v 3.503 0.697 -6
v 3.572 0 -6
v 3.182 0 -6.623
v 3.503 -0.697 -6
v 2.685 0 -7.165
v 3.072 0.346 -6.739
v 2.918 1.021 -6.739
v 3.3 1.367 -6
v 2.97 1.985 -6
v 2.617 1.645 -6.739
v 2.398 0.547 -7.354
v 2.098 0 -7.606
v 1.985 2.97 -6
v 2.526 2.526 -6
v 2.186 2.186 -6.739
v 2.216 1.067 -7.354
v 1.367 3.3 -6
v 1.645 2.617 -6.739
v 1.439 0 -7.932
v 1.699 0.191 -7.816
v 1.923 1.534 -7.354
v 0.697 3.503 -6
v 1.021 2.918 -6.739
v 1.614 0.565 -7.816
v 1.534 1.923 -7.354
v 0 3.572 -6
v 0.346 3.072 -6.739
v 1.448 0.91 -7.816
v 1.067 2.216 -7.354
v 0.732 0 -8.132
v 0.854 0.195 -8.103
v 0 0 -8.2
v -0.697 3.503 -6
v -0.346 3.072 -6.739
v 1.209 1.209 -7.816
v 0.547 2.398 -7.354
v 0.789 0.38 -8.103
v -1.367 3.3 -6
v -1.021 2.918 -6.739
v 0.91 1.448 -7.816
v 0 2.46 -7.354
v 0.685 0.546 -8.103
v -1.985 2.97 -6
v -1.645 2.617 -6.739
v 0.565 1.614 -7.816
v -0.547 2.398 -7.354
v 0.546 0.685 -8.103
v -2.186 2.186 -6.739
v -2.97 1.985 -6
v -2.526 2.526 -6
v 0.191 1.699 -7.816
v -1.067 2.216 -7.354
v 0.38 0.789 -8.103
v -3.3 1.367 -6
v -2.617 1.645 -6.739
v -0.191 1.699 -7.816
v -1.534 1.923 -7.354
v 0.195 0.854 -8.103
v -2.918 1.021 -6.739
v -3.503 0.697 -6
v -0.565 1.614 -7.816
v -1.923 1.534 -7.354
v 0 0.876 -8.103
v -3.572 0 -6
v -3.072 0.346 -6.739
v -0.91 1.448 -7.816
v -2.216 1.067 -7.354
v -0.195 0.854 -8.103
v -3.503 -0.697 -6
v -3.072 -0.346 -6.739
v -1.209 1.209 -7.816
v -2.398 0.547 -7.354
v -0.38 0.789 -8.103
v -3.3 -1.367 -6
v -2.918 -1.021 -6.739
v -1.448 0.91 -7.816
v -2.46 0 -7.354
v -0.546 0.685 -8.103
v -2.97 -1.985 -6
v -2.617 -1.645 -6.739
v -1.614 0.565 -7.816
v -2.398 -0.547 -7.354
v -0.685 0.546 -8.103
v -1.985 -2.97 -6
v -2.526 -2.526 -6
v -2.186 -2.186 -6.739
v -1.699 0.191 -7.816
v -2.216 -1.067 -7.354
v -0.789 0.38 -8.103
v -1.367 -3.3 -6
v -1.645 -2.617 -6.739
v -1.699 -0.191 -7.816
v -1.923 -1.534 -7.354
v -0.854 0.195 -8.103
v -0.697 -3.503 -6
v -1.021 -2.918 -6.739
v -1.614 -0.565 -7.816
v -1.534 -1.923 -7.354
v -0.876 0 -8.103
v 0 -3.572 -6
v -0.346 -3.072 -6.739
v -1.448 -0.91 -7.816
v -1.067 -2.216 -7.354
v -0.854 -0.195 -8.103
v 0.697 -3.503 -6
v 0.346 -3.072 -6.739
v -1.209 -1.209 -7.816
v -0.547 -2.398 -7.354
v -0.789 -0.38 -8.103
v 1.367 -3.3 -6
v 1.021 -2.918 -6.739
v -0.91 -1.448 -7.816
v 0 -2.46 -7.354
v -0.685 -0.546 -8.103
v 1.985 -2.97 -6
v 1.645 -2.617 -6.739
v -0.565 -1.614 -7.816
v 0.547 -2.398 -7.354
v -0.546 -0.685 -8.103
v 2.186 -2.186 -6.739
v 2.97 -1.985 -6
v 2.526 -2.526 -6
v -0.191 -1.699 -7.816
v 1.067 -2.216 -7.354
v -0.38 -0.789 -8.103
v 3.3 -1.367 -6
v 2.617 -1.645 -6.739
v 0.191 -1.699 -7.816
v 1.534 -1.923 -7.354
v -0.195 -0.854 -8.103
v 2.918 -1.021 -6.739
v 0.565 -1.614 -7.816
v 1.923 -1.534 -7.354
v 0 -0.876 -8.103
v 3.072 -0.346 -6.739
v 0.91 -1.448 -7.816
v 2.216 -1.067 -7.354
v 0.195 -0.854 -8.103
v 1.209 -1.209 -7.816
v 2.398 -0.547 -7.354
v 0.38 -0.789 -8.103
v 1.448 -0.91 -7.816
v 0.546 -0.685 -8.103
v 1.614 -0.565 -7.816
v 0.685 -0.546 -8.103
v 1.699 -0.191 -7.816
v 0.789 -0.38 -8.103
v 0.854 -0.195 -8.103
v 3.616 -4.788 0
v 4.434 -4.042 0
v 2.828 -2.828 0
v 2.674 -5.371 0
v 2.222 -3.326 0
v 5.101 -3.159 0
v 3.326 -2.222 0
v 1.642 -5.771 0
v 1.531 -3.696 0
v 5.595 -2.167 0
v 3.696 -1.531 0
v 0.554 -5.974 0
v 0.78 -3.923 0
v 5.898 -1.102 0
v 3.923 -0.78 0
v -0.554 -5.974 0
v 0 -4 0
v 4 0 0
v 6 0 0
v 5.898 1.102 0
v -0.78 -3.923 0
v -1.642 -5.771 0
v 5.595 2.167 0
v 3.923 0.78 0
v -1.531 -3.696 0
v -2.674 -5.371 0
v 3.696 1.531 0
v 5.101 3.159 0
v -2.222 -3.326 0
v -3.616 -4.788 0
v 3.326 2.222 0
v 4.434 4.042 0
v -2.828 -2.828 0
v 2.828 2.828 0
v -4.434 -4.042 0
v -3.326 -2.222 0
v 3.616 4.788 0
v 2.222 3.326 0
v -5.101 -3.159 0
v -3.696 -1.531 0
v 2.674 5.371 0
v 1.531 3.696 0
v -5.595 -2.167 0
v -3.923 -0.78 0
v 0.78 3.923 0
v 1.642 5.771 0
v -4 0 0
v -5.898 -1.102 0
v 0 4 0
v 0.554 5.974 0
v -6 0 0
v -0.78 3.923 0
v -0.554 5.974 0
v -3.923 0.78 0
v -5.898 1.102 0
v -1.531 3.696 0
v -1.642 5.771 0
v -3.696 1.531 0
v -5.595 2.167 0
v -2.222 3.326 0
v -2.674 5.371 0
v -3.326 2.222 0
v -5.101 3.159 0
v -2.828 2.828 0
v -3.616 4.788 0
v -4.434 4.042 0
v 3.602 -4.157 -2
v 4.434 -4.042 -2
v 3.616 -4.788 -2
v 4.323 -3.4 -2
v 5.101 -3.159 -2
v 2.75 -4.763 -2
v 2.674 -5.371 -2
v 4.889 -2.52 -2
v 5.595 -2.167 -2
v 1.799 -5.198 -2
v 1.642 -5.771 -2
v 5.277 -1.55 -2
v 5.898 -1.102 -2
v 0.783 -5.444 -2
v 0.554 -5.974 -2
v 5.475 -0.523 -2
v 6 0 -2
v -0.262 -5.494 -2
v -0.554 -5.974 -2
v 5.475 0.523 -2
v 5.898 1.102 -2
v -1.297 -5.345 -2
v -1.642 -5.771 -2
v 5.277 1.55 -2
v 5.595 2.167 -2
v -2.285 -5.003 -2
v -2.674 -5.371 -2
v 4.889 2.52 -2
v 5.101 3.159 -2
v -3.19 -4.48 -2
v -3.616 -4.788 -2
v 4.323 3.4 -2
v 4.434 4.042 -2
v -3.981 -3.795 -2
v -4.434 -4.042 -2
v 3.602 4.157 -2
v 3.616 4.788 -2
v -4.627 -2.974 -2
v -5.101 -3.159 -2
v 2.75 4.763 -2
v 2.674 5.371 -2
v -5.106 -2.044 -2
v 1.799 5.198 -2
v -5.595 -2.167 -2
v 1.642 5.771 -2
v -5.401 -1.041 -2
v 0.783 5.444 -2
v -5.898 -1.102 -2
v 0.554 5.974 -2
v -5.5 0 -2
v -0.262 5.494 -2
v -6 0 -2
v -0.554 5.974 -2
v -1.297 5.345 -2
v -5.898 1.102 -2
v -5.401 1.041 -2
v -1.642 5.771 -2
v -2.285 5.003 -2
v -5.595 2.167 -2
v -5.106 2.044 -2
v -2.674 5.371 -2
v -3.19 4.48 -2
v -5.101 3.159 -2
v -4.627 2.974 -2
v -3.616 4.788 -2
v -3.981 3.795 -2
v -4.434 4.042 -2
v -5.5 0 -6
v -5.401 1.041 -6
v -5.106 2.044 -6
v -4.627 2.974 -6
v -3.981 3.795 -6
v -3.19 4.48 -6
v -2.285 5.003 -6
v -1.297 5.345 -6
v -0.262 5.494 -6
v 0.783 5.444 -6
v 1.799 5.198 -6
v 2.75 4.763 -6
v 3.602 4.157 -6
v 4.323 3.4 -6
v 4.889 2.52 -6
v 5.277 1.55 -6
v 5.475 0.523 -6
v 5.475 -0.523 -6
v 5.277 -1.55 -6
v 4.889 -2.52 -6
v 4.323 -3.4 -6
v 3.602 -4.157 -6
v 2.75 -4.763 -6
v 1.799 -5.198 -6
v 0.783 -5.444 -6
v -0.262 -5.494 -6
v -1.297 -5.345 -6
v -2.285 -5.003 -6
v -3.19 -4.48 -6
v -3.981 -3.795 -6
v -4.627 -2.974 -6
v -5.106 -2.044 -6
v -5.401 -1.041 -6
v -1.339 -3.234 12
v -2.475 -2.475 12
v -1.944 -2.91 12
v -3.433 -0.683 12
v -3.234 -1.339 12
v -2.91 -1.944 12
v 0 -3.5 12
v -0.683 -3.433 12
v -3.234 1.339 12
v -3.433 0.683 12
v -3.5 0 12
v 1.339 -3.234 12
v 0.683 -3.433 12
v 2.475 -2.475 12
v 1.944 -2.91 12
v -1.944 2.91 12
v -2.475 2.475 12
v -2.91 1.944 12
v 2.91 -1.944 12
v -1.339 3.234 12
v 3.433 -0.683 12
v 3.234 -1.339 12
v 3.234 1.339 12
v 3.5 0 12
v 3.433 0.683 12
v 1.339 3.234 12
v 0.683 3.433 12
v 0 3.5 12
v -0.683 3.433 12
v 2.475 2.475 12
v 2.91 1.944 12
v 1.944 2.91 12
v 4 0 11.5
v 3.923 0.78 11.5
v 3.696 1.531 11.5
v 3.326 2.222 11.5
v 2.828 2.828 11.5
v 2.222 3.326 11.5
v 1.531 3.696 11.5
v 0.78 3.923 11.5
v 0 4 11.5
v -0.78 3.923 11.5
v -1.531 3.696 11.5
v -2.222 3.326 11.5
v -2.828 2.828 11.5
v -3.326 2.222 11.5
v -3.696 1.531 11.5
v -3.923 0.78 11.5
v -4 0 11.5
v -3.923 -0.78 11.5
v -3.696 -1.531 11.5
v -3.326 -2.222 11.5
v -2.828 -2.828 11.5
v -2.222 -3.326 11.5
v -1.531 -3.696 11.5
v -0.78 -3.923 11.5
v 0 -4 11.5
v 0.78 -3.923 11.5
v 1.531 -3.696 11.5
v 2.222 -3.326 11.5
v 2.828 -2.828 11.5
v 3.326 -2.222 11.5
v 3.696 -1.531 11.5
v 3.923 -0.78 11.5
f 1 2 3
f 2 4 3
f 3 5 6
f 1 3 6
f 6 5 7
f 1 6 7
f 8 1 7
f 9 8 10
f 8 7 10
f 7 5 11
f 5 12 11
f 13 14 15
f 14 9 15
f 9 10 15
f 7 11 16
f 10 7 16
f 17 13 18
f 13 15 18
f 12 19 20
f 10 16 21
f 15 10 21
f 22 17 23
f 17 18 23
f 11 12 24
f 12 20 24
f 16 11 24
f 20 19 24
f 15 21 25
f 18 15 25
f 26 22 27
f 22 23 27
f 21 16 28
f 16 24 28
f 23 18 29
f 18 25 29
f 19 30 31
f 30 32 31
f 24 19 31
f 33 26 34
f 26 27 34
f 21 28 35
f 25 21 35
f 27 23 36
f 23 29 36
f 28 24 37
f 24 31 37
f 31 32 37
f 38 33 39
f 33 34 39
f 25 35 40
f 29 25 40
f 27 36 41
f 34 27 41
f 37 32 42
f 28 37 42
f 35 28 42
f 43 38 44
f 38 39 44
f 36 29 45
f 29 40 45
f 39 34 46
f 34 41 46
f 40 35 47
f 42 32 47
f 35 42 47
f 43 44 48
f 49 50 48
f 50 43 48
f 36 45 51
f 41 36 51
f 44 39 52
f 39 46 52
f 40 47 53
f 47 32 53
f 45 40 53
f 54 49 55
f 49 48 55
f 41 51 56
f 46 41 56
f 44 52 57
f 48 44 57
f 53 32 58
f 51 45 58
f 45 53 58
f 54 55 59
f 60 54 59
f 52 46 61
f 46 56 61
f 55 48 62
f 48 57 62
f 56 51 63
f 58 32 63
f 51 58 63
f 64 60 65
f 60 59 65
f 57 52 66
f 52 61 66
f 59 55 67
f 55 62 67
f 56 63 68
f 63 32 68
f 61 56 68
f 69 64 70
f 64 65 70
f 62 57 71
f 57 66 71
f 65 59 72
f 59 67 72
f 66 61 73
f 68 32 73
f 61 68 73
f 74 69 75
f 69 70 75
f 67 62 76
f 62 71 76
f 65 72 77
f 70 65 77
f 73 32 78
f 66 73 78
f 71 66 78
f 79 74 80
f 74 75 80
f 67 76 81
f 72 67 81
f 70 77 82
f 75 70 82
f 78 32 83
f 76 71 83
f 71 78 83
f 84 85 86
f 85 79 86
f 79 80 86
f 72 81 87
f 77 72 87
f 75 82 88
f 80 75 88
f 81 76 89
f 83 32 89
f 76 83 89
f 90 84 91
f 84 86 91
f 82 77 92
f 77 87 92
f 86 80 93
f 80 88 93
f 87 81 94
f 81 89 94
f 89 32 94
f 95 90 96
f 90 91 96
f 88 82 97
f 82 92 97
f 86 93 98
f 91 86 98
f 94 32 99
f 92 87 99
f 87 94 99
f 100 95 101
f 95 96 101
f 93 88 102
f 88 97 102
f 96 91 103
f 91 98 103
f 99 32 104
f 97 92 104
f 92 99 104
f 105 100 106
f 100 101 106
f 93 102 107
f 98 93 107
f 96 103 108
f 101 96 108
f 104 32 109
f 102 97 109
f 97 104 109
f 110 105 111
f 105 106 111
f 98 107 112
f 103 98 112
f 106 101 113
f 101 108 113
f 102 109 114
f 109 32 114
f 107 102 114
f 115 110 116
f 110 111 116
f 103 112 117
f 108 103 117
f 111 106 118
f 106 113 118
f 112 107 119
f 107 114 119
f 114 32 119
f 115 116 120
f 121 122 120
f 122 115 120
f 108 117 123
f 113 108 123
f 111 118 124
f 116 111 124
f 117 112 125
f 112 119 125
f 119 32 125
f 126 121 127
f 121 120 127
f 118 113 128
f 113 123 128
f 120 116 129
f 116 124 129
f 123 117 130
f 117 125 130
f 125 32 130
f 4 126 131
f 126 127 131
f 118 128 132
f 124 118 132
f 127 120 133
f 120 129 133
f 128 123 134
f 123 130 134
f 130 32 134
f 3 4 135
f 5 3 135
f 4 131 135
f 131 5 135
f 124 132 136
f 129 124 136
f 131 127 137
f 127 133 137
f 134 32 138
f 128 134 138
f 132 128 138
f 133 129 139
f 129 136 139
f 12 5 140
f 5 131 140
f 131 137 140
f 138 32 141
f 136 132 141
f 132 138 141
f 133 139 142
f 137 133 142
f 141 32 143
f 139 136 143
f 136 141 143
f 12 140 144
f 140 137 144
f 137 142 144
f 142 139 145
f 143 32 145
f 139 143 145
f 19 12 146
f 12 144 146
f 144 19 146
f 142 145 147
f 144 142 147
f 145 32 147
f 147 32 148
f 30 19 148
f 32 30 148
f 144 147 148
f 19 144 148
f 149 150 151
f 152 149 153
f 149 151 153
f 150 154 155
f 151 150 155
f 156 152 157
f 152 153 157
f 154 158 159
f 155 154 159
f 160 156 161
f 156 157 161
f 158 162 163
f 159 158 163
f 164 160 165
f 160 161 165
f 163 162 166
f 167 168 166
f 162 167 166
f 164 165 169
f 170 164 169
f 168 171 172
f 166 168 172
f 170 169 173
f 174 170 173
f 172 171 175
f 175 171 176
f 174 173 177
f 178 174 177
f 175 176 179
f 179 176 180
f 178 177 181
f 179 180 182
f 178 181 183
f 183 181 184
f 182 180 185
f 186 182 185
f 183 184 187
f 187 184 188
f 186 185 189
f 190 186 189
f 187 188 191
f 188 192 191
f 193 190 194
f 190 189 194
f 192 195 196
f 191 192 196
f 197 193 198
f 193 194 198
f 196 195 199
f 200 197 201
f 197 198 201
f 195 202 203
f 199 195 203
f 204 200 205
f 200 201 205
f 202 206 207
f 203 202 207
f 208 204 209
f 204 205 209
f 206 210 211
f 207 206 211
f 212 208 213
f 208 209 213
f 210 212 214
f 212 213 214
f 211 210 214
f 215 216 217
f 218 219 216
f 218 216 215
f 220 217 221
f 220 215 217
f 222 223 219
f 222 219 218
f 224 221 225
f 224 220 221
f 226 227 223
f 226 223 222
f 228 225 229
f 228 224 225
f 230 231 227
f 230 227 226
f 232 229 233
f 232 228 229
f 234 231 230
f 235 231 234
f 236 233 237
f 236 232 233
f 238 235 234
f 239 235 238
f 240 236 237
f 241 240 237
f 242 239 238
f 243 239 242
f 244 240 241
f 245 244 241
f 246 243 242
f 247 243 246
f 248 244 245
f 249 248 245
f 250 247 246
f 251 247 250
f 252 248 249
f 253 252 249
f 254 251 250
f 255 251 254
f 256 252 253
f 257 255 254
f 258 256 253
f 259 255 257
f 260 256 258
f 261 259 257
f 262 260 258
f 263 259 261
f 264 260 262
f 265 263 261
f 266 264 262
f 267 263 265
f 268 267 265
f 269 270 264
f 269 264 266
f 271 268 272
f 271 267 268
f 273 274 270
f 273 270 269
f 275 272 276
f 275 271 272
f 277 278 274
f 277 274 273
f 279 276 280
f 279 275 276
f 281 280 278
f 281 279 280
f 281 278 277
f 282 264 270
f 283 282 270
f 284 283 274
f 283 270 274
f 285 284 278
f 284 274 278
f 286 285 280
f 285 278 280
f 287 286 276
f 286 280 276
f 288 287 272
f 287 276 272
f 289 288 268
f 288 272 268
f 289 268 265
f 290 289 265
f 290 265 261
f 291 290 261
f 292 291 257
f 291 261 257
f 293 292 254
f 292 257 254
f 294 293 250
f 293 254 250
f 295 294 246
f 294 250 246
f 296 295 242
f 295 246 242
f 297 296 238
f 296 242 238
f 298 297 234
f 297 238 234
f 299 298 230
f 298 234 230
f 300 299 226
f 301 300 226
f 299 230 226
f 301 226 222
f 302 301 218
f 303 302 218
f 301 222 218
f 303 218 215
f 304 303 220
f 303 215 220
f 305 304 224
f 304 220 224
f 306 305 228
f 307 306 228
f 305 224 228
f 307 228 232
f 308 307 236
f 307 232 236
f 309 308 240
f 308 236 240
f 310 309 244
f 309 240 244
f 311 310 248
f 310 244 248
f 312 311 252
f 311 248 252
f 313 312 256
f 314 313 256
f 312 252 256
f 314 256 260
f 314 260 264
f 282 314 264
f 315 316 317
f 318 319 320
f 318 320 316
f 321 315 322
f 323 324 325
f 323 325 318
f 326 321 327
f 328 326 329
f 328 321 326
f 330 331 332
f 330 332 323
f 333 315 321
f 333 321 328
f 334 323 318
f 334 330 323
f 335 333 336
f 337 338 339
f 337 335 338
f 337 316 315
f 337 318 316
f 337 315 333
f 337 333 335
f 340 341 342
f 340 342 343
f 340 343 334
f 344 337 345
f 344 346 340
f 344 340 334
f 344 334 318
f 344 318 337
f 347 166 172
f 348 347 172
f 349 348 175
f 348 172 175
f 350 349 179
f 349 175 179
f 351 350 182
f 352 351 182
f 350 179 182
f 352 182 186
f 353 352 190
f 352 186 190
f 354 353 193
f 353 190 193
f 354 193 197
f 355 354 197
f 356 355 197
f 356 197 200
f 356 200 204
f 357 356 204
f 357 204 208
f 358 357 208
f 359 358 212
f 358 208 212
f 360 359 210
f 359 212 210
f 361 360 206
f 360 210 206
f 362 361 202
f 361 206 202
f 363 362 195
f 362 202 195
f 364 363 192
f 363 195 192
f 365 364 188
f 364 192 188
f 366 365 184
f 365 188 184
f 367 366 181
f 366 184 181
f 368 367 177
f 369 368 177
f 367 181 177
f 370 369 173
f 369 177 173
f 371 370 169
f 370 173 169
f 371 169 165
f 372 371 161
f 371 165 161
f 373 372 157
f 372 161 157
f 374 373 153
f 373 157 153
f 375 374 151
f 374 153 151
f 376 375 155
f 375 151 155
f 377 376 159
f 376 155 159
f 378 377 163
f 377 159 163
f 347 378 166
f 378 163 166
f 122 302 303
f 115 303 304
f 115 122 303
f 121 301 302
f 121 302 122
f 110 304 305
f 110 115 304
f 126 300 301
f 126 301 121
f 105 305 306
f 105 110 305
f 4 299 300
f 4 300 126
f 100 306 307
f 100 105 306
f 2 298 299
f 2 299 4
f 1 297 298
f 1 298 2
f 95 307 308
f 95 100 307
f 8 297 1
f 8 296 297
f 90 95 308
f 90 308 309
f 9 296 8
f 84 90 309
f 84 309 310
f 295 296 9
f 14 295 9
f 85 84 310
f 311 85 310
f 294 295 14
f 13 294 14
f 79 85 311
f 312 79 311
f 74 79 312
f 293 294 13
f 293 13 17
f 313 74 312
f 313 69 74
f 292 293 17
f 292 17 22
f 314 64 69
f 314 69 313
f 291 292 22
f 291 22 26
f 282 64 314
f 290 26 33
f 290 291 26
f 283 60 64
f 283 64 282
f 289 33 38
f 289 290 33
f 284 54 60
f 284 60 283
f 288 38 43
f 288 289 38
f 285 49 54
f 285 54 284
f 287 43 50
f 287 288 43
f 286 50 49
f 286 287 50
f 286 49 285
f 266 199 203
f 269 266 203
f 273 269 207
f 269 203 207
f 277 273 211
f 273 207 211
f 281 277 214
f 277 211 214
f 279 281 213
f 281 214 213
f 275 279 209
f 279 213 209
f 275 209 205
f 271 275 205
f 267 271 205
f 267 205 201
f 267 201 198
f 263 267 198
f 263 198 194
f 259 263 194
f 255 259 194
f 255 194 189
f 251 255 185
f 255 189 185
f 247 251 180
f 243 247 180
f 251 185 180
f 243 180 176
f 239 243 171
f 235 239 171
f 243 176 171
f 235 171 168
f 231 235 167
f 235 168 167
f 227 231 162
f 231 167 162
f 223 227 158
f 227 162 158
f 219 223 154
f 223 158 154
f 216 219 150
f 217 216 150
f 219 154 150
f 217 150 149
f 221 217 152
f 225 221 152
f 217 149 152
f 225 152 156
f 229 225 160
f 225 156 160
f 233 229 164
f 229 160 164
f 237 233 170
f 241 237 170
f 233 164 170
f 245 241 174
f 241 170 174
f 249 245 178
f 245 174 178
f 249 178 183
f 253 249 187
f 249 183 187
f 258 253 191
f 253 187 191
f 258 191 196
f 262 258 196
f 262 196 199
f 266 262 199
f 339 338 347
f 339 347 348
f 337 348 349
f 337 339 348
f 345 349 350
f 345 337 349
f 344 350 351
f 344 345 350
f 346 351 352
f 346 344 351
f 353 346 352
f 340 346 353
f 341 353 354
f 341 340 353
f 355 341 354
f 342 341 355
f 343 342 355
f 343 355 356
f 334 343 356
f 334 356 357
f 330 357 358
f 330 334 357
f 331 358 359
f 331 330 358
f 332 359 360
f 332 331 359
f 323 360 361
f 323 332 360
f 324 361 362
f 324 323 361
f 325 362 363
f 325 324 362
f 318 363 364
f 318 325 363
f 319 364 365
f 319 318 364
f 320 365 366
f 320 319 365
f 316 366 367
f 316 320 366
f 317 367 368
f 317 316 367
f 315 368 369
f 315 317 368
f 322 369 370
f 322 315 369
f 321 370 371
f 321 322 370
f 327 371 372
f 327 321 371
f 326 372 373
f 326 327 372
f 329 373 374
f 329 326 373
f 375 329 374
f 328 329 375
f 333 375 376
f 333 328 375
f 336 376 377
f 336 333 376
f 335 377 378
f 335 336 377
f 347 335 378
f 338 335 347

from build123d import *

# Parameters (mm, degrees)
SKETCH_1_R      = 4
EXTRUDE_1_DEPTH = 12
SKETCH_2_R      = 6
EXTRUDE_2_DEPTH = 2
SKETCH_3_R      = 5.5
EXTRUDE_3_DEPTH = 4
CHAMFER_1_SIZE  = 0.5


with BuildPart() as part:
    # 草图1 → 凸台-拉伸1 (new body)
    with BuildSketch(Plane.XY):
        Circle(SKETCH_1_R)
    extrude(amount=EXTRUDE_1_DEPTH)

    # 草图2 → 凸台-拉伸2 (add)
    with BuildSketch(Plane(origin=(0, 0, 0), x_dir=(-1, 0, 0), z_dir=(0, 0, -1))):
        Circle(SKETCH_2_R)
    extrude(amount=EXTRUDE_2_DEPTH)

    # 草图3 → 凸台-拉伸3 (add)
    with BuildSketch(Plane(origin=(0, 0, -2), x_dir=(-1, 0, 0), z_dir=(0, 0, -1))):
        Circle(SKETCH_3_R)
    extrude(amount=EXTRUDE_3_DEPTH)

    # 草图4 → 旋转1 (revolve)
    with BuildSketch(Plane(origin=(0, 0, 0), x_dir=(1, 0, 0), z_dir=(0, 1, 0))):
        with BuildLine():
            Line((0, 8.2), (0, 0.2))
            ThreePointArc((0, 0.2), (4, 4.2), (0, 8.2))
        make_face()
    revolve(axis=Axis((0, 0, -9.405734293), (0, 0, 1)))

    # 倒角1
    chamfer_1_edges = [part.edges().sort_by_distance(p)[0] for p in [
        (-4, 0, 12),
    ]]
    chamfer(chamfer_1_edges, length=CHAMFER_1_SIZE)


solid = part.part
